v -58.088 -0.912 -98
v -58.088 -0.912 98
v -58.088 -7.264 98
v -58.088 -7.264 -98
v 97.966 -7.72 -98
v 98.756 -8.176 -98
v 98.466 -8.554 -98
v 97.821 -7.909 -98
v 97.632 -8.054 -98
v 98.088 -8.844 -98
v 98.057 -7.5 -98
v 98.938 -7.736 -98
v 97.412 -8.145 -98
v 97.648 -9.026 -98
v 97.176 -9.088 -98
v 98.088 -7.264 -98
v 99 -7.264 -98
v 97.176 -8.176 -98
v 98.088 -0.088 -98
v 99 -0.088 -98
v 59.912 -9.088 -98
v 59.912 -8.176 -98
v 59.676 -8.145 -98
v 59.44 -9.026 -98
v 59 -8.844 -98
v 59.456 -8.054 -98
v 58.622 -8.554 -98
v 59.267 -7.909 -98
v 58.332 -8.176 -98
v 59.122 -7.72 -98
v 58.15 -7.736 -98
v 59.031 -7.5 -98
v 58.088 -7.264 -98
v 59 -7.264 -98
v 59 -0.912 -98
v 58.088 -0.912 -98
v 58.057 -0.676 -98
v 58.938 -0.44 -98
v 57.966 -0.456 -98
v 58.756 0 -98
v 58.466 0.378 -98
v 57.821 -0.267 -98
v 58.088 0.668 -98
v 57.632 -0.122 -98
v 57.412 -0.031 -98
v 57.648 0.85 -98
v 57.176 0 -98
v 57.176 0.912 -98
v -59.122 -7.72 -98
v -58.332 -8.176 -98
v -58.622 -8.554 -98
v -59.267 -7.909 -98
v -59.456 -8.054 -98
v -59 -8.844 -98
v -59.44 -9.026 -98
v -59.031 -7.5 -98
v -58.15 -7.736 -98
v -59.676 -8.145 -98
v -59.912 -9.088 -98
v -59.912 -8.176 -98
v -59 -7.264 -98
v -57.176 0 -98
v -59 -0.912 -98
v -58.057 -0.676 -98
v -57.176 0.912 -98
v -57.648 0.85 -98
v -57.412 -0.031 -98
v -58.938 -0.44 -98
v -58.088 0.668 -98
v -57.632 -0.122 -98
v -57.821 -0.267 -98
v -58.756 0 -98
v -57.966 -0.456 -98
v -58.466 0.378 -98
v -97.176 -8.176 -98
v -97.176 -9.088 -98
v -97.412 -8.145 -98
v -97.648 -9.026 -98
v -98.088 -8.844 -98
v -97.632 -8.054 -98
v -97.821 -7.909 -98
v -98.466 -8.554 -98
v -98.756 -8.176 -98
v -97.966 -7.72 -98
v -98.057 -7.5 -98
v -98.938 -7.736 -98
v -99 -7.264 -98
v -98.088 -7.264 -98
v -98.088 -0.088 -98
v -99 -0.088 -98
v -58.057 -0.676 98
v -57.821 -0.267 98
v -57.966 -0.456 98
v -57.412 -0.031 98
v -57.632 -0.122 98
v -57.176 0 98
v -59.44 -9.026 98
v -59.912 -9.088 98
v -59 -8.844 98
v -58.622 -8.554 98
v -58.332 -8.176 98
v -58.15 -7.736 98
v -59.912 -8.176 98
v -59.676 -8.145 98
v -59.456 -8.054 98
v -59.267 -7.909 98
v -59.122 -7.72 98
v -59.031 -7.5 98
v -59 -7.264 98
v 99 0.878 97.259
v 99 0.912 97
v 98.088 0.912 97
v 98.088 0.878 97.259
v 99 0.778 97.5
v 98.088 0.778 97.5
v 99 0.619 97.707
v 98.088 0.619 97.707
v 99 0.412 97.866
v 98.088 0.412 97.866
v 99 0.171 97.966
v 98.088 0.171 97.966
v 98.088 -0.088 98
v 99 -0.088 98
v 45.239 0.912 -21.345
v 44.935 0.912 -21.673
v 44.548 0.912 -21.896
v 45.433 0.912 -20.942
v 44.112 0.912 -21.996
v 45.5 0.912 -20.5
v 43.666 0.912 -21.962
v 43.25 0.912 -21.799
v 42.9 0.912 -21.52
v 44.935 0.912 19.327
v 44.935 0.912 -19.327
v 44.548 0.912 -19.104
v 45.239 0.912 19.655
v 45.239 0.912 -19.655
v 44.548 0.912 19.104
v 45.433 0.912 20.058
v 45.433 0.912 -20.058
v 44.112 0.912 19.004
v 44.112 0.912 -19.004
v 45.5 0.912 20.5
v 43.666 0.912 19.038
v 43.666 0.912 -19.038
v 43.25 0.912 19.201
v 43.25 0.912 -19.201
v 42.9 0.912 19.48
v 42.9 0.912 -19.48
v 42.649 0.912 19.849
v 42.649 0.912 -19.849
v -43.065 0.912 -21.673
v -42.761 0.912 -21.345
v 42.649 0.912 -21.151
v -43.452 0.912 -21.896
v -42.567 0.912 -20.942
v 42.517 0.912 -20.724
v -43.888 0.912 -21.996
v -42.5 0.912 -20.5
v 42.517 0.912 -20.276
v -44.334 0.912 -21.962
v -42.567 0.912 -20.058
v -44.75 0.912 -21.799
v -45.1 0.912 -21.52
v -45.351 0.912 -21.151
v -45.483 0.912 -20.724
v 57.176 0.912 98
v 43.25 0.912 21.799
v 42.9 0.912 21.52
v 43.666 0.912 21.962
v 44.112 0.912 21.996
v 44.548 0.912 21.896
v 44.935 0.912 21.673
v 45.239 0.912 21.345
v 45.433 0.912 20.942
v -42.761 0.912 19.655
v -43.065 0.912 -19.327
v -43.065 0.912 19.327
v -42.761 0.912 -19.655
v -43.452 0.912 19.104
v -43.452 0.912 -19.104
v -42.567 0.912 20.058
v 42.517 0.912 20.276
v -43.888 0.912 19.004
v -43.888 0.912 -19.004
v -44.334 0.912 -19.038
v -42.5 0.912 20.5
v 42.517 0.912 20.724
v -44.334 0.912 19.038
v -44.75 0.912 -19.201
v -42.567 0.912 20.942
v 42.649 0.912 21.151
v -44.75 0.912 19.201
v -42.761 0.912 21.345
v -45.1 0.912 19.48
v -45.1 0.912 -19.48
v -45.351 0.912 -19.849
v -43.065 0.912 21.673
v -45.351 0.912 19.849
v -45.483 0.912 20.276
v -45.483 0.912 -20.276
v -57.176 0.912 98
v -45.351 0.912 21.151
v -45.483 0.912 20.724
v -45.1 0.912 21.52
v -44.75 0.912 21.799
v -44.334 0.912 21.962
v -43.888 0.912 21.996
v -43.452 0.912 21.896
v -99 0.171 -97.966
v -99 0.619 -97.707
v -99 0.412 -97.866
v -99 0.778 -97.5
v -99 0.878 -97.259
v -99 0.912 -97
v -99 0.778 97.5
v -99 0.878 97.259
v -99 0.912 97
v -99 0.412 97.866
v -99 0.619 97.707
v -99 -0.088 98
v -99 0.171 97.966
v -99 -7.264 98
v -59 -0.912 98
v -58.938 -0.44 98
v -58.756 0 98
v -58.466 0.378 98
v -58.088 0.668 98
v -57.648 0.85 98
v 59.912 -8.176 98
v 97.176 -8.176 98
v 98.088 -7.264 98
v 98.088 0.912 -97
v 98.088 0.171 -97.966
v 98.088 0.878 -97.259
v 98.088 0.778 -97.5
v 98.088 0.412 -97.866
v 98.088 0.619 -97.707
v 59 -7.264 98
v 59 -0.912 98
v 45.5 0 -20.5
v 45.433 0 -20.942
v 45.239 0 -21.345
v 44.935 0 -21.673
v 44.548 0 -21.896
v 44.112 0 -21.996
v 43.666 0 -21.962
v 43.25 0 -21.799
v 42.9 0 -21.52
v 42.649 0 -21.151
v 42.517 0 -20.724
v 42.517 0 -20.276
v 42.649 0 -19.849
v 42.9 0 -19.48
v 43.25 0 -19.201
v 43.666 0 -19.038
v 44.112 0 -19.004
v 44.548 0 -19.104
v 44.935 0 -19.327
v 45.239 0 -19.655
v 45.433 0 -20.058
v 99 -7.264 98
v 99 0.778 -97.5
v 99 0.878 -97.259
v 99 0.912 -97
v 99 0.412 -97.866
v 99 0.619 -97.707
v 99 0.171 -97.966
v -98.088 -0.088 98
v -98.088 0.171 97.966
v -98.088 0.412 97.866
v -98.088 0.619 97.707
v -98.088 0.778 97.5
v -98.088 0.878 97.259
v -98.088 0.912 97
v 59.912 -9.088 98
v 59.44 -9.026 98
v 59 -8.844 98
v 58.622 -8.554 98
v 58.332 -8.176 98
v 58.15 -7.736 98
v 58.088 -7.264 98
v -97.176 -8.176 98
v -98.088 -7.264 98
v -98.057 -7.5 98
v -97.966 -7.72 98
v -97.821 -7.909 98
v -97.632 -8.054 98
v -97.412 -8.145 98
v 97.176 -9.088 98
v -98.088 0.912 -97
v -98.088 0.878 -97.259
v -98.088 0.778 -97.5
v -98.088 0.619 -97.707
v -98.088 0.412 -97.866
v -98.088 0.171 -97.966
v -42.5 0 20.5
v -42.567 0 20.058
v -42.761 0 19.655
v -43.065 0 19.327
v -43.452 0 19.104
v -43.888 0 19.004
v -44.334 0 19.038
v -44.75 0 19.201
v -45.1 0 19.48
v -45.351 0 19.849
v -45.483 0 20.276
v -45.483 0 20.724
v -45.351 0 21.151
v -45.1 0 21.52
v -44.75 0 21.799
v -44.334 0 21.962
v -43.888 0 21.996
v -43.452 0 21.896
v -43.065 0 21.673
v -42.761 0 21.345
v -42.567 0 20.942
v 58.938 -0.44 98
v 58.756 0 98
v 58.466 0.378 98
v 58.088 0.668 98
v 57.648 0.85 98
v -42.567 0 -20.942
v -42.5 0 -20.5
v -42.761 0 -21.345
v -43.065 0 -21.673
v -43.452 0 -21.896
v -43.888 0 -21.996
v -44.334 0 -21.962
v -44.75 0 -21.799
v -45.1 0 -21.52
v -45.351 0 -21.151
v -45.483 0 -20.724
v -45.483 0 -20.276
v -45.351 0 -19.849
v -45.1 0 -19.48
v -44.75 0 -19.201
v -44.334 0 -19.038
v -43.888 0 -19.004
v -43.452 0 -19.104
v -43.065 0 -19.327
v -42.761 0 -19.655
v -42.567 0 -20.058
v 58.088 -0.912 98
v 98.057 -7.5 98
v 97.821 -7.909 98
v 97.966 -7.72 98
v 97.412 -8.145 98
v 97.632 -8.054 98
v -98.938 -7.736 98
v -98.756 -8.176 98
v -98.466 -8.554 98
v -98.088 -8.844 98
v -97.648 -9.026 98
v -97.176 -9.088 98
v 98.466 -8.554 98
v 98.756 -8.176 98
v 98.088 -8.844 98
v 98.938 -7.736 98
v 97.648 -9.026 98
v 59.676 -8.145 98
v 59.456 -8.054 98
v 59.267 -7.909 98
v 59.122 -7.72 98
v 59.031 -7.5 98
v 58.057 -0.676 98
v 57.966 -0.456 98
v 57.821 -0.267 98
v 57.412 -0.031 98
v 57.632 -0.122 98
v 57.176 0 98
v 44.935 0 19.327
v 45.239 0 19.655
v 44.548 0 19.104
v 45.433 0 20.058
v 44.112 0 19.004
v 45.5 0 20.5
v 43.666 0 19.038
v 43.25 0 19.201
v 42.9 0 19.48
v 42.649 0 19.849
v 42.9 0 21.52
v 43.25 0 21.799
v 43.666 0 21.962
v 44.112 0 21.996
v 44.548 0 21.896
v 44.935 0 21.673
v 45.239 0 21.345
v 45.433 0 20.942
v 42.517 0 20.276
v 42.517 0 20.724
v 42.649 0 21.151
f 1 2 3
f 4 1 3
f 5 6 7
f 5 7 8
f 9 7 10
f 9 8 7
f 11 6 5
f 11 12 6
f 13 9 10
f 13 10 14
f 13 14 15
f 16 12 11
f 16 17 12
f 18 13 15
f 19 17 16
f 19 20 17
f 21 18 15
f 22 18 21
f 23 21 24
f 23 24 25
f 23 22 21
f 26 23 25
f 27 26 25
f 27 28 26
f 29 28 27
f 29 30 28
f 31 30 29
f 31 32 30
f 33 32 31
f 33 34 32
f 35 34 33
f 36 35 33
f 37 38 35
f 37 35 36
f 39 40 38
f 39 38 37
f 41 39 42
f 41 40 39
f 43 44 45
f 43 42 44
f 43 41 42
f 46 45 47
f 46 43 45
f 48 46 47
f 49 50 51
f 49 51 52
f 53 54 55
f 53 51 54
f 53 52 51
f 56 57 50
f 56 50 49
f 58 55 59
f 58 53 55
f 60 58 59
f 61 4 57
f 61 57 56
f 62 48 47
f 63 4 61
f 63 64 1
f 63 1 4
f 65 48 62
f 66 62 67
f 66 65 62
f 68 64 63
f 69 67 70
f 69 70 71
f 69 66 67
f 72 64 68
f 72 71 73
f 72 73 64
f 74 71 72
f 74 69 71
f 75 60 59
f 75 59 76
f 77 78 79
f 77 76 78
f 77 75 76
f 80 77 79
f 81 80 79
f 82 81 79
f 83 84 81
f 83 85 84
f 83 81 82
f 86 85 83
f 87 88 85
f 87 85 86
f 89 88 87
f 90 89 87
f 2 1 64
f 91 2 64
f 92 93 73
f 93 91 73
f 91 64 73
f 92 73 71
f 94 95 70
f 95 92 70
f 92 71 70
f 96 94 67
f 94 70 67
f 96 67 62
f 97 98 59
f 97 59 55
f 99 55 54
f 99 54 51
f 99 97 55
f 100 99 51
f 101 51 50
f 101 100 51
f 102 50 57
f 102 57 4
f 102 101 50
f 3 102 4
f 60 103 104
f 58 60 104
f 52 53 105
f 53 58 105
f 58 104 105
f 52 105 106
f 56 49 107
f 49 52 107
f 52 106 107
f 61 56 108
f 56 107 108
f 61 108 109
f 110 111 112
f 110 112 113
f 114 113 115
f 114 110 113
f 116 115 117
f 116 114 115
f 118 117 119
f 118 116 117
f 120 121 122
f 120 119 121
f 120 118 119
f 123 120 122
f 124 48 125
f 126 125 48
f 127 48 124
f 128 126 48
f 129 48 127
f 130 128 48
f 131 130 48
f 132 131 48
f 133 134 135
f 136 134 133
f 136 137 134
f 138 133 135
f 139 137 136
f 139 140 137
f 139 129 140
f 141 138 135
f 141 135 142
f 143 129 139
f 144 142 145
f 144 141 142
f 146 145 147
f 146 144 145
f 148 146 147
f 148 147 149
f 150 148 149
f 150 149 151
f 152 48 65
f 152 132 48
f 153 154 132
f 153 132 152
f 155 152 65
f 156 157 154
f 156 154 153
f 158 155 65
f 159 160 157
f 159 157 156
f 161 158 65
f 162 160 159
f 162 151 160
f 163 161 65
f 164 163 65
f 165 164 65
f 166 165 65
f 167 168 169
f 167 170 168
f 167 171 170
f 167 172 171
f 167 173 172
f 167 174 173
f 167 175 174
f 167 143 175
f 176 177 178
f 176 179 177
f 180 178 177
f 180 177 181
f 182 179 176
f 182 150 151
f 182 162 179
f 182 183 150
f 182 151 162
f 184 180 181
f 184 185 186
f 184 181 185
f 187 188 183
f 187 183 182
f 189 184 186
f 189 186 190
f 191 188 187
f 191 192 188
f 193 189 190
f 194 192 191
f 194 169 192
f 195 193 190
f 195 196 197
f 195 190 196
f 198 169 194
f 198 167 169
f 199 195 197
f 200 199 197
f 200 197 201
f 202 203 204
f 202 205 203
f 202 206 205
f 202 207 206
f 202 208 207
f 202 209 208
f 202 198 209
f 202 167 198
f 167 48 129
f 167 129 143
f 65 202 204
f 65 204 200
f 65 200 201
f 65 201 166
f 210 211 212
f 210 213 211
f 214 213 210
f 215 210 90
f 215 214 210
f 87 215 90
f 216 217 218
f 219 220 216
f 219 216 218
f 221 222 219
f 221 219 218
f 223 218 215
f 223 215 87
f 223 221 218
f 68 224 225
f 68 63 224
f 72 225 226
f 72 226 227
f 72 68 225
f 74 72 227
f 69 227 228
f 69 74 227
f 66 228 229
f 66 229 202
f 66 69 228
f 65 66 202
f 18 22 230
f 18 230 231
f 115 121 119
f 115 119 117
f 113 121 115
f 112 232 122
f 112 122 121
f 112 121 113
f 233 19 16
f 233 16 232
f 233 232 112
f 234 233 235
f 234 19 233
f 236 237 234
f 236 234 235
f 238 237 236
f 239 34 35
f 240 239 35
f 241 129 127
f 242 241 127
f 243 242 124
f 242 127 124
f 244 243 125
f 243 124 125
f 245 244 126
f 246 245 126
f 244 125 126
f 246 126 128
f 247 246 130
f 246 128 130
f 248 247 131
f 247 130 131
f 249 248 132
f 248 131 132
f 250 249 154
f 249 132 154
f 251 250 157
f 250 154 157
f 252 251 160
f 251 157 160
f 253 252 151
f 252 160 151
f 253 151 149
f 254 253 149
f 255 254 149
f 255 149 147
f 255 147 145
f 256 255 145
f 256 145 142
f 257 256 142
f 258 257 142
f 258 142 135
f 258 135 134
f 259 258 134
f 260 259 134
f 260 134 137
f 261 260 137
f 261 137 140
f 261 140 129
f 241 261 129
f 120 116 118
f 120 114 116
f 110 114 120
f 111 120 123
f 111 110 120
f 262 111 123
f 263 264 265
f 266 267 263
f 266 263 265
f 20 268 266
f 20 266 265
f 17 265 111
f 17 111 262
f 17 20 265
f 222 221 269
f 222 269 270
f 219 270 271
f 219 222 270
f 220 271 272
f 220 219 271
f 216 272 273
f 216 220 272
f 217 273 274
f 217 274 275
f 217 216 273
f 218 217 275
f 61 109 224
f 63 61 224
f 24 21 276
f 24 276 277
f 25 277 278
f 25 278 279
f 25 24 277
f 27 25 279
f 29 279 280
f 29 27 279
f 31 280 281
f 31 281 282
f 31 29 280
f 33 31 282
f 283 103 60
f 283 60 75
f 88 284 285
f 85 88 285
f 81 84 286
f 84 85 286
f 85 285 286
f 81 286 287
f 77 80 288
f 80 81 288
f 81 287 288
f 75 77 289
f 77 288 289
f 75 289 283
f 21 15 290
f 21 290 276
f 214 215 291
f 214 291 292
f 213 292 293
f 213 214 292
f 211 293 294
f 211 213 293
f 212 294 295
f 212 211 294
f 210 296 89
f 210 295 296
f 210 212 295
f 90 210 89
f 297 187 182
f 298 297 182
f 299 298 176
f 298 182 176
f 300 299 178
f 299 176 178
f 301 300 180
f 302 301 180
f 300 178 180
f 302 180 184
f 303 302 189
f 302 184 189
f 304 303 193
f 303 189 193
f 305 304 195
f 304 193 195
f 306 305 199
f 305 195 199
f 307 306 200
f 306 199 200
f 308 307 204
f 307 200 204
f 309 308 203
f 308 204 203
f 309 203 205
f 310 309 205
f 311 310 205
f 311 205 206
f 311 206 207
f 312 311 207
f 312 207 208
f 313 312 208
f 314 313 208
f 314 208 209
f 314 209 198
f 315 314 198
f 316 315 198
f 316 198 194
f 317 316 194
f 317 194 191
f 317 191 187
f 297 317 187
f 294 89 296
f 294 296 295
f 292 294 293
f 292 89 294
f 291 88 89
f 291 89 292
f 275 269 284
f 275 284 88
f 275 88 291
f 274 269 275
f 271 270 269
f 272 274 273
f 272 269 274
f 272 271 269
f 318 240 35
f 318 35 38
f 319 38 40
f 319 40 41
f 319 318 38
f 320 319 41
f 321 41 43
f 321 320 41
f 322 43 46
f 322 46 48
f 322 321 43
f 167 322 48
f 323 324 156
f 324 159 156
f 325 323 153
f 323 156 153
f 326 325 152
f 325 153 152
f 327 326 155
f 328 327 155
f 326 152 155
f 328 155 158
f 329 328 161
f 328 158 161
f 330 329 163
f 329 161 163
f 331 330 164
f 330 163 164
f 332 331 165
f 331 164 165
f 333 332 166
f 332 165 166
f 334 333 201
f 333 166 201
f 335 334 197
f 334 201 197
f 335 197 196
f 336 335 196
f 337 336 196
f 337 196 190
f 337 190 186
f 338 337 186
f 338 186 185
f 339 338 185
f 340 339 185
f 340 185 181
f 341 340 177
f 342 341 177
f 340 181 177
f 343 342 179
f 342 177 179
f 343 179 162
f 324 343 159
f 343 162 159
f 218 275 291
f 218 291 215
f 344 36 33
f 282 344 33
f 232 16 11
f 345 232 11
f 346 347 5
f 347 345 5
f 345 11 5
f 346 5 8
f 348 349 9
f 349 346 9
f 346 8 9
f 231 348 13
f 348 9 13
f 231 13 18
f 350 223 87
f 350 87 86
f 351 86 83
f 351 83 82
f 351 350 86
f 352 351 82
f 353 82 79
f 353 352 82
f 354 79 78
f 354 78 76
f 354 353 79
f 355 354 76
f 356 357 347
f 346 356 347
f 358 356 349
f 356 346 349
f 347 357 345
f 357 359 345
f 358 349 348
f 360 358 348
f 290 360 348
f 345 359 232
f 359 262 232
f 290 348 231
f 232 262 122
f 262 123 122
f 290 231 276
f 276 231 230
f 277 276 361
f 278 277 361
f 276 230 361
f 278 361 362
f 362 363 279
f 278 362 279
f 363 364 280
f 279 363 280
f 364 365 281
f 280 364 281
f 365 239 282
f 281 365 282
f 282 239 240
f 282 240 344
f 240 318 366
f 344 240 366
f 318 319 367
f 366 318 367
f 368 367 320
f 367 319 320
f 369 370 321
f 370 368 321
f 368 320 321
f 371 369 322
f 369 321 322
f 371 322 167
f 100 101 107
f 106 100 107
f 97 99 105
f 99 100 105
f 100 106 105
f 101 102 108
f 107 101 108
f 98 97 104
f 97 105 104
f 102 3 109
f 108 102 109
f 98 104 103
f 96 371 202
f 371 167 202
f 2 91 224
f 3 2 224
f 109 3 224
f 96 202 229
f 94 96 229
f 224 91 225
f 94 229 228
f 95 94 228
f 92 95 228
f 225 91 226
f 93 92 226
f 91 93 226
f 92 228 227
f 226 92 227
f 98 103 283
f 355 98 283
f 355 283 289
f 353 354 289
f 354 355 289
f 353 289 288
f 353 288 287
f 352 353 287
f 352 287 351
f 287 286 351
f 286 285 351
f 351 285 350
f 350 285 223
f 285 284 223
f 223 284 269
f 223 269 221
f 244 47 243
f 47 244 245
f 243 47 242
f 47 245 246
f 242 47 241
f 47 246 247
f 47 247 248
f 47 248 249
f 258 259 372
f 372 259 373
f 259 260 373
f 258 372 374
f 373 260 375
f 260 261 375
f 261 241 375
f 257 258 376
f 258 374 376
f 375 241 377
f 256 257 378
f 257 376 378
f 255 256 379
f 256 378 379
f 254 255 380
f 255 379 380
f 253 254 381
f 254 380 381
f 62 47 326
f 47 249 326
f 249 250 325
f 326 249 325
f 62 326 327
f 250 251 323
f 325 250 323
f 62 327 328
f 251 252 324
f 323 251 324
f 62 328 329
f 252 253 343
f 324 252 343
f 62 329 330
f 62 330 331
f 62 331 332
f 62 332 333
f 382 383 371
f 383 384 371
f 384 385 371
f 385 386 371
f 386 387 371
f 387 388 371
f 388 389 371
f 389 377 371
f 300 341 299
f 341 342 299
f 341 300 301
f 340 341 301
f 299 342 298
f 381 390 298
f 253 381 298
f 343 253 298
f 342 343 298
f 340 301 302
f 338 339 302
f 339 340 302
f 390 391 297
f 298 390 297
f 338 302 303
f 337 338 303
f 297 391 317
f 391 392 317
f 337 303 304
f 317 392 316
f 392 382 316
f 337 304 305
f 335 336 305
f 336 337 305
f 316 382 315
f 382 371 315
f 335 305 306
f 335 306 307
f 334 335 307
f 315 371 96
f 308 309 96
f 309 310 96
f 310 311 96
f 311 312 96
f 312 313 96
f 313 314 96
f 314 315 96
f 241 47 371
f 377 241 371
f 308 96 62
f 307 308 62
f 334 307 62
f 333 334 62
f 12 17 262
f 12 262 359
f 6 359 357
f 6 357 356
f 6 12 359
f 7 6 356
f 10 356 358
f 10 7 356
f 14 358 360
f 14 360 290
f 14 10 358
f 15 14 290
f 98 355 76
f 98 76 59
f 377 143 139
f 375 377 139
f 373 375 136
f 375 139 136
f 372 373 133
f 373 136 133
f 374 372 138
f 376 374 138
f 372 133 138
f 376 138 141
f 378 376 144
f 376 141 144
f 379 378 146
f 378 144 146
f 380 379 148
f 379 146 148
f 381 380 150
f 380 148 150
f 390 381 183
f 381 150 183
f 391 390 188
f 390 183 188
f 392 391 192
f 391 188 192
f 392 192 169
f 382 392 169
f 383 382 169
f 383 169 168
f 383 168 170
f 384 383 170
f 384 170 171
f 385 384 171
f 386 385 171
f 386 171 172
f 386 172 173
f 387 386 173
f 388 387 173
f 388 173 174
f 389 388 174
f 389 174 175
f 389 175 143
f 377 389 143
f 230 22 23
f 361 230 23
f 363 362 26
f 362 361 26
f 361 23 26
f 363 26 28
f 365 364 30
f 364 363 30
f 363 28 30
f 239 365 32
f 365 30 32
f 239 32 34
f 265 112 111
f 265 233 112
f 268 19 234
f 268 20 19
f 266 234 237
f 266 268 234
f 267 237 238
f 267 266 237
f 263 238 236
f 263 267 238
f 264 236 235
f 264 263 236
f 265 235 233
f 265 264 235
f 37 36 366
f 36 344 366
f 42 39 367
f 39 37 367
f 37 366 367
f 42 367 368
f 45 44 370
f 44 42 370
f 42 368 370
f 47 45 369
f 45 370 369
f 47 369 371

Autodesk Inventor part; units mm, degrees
ref_plane "YZ Plane" through (0, 0, 0) normal (1, 0, 0) x (0, 1, 0)
ref_plane "XZ Plane" through (0, 0, 0) normal (0, 1, 0) x (-1, 0, 0)
ref_plane "XY Plane" through (0, 0, 0) normal (0, 0, 1) x (1, 0, 0)
sketch "Sketch1" plane through (0, 0, 0) normal (0, 1, 0) x (-1, 0, 0)
  line L0 (-59, -98) -> (59, -98)
  line L1 (59, -98) -> (59, 98)
  line L2 (59, 98) -> (-59, 98)
  line L3 (-59, 98) -> (-59, -98)
  line L4 (-59, -98) -> (59, 98) construction
  line L5 (59, -98) -> (-59, 98) construction
  point P0 (0, 0)
  dimension "d0" = 118
  dimension "d1" = 196
extrude "Plate1" add sketch "Sketch1" along normal blind 0.9119
sketch "Sketch2" plane through (58.0881, 0.9119, 98) normal (1, 0, 0) x (0, 1, 0)
  line L0 (0, -196) -> (0, 0)
  line L1 (0, 0) -> (-10, 0)
  line L2 (-10, 0) -> (-10, -196)
  line L3 (-10, -196) -> (0, -196)
edge flange "Flange1" height 10 angle 90 thickness 0.9119 bend radius 0.9119 thickness toward (1, 0, 0) relief tear relief width 0.9119 relief depth 0.4559 corner gap 0.9119 corner form 0 edges at (59, 0, 0) (-59, 0, 0) wall of the first edge with corners at (58.0881, 0.9119, -98) (58.0881, 0.9119, 98) (58.0881, -9.0881, 98) (58.0881, -9.0881, -98)
bend "Bend1"
corner "Corner1"
sketch "Sketch3" plane through (58.0881, -8.1763, -98) normal (0, -1, 0) x (1, 0, 0)
  line L0 (0, 196) -> (0, 0)
  line L1 (0, 0) -> (40, 0)
  line L2 (40, 0) -> (40, 196)
  line L3 (40, 196) -> (0, 196)
edge flange "Flange2" height 40 angle 90 thickness 0.9119 bend radius 0.9119 thickness toward (0, -1, 0) relief tear relief width 0.9119 relief depth 0.4559 corner gap 0.9119 corner form 0 edges at (59, -9.0881, 0) (-59, -9.0881, 0) wall of the first edge with corners at (58.0881, -8.1763, 98) (58.0881, -8.1763, -98) (98.0881, -8.1763, -98) (98.0881, -8.1763, 98)
bend "Bend2"
corner "Corner2"
sketch "Sketch4" plane through (98.0881, -8.1763, -98) normal (1, 0, 0) x (0, 1, 0)
  line L0 (0, 196) -> (0, 0)
  line L1 (0, 0) -> (9.0881, 0)
  line L2 (9.0881, 0) -> (9.0881, 196)
  line L3 (9.0881, 196) -> (0, 196)
edge flange "Flange3" height 10 angle 90 thickness 0.9119 bend radius 0.9119 thickness toward (1, 0, 0) relief tear relief width 0.9119 relief depth 0.4559 corner gap 0.9119 corner form 0 edges at (98.0881, -8.1763, 0) (-98.0881, -8.1763, 0) wall of the first edge with corners at (98.0881, -8.1763, 98) (98.0881, -8.1763, -98) (98.0881, 0.9119, -98) (98.0881, 0.9119, 98)
bend "Bend3"
corner "Corner3"
sketch "Sketch5" plane through (0, 0.9119, 0) normal (0, 1, 0) x (1, 0, 0)
  line L0 (0, 0) -> (-59, 0)
  line L1 (-59, 0) -> (-59, 98)
  line L2 (-59, 98) -> (0, 98)
  line L3 (0, 98) -> (0, 0)
  line L4 (140, -28) -> (-140, -28)
  line L5 (-140, -28) -> (-140, 28)
  line L6 (-140, 28) -> (140, 28)
  line L7 (140, 28) -> (140, -28)
  line L8 (140, -28) -> (-140, 28) construction
  line L9 (-140, -28) -> (140, 28) construction
  circle A0 centre (-44, 20.5) radius 1.5
  circle A1 centre (44, 20.5) radius 1.5
  circle A2 centre (-44, -20.5) radius 1.5
  circle A3 centre (44, -20.5) radius 1.5
  dimension "d34" = 280
  dimension "d35" = 56
  dimension "d36" = 3
  dimension "d38" = 44
  dimension "d41" = 20.5
extrude "Cut1" cut sketch "Sketch5" against normal blind 0.9119 contours A0 | A1 | A2 | A3
fillet "Corner Round1" radius 1 4 edges at (-98.5441, 0.9119, 98) (-98.5441, 0.9119, -98) (98.5441, 0.9119, -98) (98.5441, 0.9119, 98)
equation "\"d0\" = foot_x - 2 * frame_border"
equation "\"d1\" = foot_y"
equation "\"d34\" = frame_front_x"
equation "\"d35\" = frame_front_y"
equation "\"d36\" = m3_diameter"
equation "\"d38\" = laser_offset_x - frame_front_fold"
equation "\"d41\" = 0.5 * frame_front_y - 0.5 * frame_front_fold"
equation "\"d39\" = Thickness"
equation "\"d33\" = corner_small_r"
equation "\"Thickness\" = foot_t"
equation "\"d3\" = BendReliefWidth"
equation "\"d4\" = BendReliefDepth"
equation "\"d5\" = MinimumRemnant"
equation "\"d6\" = BendRadius"
equation "\"d7\" = foot_z"
equation "\"d9\" = BendRadius"
equation "\"d10\" = CornerReliefSize"
equation "\"d11\" = GapSize"
equation "\"d12\" = JacobiRadiusSize"
equation "\"d13\" = BendReliefWidth"
equation "\"d14\" = BendReliefDepth"
equation "\"d15\" = MinimumRemnant"
equation "\"d16\" = BendRadius"
equation "\"d17\" = frame_border"
equation "\"d19\" = BendRadius"
equation "\"d20\" = CornerReliefSize"
equation "\"d21\" = GapSize"
equation "\"d22\" = JacobiRadiusSize"
equation "\"d23\" = BendReliefWidth"
equation "\"d24\" = BendReliefDepth"
equation "\"d25\" = MinimumRemnant"
equation "\"d26\" = BendRadius"
equation "\"d27\" = foot_z"
equation "\"d29\" = BendRadius"
equation "\"d30\" = CornerReliefSize"
equation "\"d31\" = GapSize"
equation "\"d32\" = JacobiRadiusSize"
equation "\"BendRadius\" = Thickness"
equation "\"BendReliefWidth\" = Thickness"
equation "\"BendReliefDepth\" = 0.5 * Thickness"
equation "\"CornerReliefSize\" = 4 * Thickness"
equation "\"MinimumRemnant\" = 2 * Thickness"
equation "\"TransitionRadius\" = BendRadius"
equation "\"JacobiRadiusSize\" = BendRadius"
equation "\"GapSize\" = Thickness"
equation "\"laserresin\" = 5"
equation "\"st1_thickness\" = 0.91186"
equation "\"st2_thickness\" = 1.5875"
equation "\"al1_thickness\" = 0.79375"
equation "\"al2_thickness\" = 1.5875"
equation "\"bend_factor\" = 2.26205"
equation "\"st1_bend\" = 2.06267"
equation "\"st2_bend\" = 3.591"
equation "\"st3_bend\" = 113.10236"
equation "\"al1_bend\" = 1.7955"
equation "\"al2_bend\" = 3.591"
equation "\"al3_bend\" = 113.10236"
equation "\"acrylic1_thickness\" = 5.88"
equation "\"acrylic2_thickness\" = 3.15"
equation "\"acrylic3_thickness\" = 3.15"
equation "\"corner_small_r\" = 1"
equation "\"corner_big_r\" = 5"
equation "\"linear_bearing_spacing\" = 208"
equation "\"galvo_y_out_offset\" = 27"
equation "\"galvo_y_in_offset\" = 17.5"
equation "\"laser_diameter\" = 13"
equation "\"nema17_x\" = 43"
equation "\"nema17_shaft\" = 24"
equation "\"lmk8uu_x\" = 25"
equation "\"lmk8uu_shaft\" = 15"
equation "\"lmk8uu_z\" = 24"
equation "\"shf8_y\" = 43"
equation "\"acme_nut_d\" = 19.1"
equation "\"acme_nut_upper_d\" = 12.7"
equation "\"handle_spacing\" = 50.8"
equation "\"handle_d\" = 4.7625"
equation "\"handle_hole_d\" = 2.845"
equation "\"handle_projection\" = 20.6375"
equation "\"switch_spacing\" = 19"
equation "\"laser_body_diameter\" = 12"
equation "\"m3_diameter\" = 3"
equation "\"m3_head\" = 6"
equation "\"m4_diameter\" = 4"
equation "\"m5_diameter\" = 5"
equation "\"m5_head\" = 10.3"
equation "\"rivet1_diameter\" = 3.26"
equation "\"rivet2_diameter\" = 3.26"
equation "\"brass_insert_drill\" = 4"
equation "\"m5_brass_insert_drill\" = 6.7"
equation "\"m3_press_nut_drill\" = 4.24"
equation "\"m5_press_nut_drill\" = 6.35"
equation "\"platform_t\" = 1.5875"
equation "\"platform_z\" = 65"
equation "\"platform_fold_x\" = 15"
equation "\"platform_crane_gap\" = 0.1"
equation "\"platform_gap\" = 0.1"
equation "\"platform_upper_y\" = 46.625"
equation "\"crane_t\" = 1.5875"
equation "\"crane_x\" = 233"
equation "\"crane_gap\" = 0.1"
equation "\"tray_t\" = 5.88"
equation "\"tray_to_platform_oversize\" = 0"
equation "\"reservoir_t\" = 0.91186"
equation "\"reservoir_z\" = 35"
equation "\"reservoir_flap_y\" = 20.91186"
equation "\"frame_front_t\" = 0.91186"
equation "\"frame_front_x\" = 280"
equation "\"frame_front_y\" = 56"
equation "\"frame_front_fold\" = 15"
equation "\"frame_gap\" = 0.1"
equation "\"frame_back_t\" = 0.91186"
equation "\"frame_back_x\" = 277.97628"
equation "\"frame_back_y\" = 53.97628"
equation "\"frame_back_z\" = 497.97628"
equation "\"drawer_t\" = 0.91186"
equation "\"drawer_gap\" = 0.1"
equation "\"drawer_reservoir_overlap_x\" = 24.08814"
equation "\"drawer_x\" = 202.02372"
equation "\"drawer_y\" = 73"
equation "\"drawer_seal_y\" = 101"
equation "\"drawer_window_gap\" = 6"
equation "\"foot_t\" = 0.91186"
equation "\"foot_x\" = 198"
equation "\"foot_y\" = 196"
equation "\"laser_holder_t\" = 0.91186"
equation "\"laser_holder_z\" = 75"
equation "\"laser_offset_x\" = 59"
equation "\"laser_offset_y\" = 8.5"
equation "\"subframe_t\" = 0.79375"
equation "\"subframe_x\" = 66"
equation "\"subframe_y\" = 55"
equation "\"d2\" = BendRadius"
equation "\"shield_y\" = 71"
equation "\"shield_x\" = 200.2"
equation "\"shield_z\" = 259.9"
equation "\"shield_t\" = 3.15"
equation "\"magnet_t\" = 1.6"
equation "\"magnet_w\" = 12.8"
equation "\"sae_4_40_diameter\" = 2.845"
equation "\"frame_border\" = 40"
equation "\"foot_z\" = 10"
properties part number "foot" material "Steel, Mild"
